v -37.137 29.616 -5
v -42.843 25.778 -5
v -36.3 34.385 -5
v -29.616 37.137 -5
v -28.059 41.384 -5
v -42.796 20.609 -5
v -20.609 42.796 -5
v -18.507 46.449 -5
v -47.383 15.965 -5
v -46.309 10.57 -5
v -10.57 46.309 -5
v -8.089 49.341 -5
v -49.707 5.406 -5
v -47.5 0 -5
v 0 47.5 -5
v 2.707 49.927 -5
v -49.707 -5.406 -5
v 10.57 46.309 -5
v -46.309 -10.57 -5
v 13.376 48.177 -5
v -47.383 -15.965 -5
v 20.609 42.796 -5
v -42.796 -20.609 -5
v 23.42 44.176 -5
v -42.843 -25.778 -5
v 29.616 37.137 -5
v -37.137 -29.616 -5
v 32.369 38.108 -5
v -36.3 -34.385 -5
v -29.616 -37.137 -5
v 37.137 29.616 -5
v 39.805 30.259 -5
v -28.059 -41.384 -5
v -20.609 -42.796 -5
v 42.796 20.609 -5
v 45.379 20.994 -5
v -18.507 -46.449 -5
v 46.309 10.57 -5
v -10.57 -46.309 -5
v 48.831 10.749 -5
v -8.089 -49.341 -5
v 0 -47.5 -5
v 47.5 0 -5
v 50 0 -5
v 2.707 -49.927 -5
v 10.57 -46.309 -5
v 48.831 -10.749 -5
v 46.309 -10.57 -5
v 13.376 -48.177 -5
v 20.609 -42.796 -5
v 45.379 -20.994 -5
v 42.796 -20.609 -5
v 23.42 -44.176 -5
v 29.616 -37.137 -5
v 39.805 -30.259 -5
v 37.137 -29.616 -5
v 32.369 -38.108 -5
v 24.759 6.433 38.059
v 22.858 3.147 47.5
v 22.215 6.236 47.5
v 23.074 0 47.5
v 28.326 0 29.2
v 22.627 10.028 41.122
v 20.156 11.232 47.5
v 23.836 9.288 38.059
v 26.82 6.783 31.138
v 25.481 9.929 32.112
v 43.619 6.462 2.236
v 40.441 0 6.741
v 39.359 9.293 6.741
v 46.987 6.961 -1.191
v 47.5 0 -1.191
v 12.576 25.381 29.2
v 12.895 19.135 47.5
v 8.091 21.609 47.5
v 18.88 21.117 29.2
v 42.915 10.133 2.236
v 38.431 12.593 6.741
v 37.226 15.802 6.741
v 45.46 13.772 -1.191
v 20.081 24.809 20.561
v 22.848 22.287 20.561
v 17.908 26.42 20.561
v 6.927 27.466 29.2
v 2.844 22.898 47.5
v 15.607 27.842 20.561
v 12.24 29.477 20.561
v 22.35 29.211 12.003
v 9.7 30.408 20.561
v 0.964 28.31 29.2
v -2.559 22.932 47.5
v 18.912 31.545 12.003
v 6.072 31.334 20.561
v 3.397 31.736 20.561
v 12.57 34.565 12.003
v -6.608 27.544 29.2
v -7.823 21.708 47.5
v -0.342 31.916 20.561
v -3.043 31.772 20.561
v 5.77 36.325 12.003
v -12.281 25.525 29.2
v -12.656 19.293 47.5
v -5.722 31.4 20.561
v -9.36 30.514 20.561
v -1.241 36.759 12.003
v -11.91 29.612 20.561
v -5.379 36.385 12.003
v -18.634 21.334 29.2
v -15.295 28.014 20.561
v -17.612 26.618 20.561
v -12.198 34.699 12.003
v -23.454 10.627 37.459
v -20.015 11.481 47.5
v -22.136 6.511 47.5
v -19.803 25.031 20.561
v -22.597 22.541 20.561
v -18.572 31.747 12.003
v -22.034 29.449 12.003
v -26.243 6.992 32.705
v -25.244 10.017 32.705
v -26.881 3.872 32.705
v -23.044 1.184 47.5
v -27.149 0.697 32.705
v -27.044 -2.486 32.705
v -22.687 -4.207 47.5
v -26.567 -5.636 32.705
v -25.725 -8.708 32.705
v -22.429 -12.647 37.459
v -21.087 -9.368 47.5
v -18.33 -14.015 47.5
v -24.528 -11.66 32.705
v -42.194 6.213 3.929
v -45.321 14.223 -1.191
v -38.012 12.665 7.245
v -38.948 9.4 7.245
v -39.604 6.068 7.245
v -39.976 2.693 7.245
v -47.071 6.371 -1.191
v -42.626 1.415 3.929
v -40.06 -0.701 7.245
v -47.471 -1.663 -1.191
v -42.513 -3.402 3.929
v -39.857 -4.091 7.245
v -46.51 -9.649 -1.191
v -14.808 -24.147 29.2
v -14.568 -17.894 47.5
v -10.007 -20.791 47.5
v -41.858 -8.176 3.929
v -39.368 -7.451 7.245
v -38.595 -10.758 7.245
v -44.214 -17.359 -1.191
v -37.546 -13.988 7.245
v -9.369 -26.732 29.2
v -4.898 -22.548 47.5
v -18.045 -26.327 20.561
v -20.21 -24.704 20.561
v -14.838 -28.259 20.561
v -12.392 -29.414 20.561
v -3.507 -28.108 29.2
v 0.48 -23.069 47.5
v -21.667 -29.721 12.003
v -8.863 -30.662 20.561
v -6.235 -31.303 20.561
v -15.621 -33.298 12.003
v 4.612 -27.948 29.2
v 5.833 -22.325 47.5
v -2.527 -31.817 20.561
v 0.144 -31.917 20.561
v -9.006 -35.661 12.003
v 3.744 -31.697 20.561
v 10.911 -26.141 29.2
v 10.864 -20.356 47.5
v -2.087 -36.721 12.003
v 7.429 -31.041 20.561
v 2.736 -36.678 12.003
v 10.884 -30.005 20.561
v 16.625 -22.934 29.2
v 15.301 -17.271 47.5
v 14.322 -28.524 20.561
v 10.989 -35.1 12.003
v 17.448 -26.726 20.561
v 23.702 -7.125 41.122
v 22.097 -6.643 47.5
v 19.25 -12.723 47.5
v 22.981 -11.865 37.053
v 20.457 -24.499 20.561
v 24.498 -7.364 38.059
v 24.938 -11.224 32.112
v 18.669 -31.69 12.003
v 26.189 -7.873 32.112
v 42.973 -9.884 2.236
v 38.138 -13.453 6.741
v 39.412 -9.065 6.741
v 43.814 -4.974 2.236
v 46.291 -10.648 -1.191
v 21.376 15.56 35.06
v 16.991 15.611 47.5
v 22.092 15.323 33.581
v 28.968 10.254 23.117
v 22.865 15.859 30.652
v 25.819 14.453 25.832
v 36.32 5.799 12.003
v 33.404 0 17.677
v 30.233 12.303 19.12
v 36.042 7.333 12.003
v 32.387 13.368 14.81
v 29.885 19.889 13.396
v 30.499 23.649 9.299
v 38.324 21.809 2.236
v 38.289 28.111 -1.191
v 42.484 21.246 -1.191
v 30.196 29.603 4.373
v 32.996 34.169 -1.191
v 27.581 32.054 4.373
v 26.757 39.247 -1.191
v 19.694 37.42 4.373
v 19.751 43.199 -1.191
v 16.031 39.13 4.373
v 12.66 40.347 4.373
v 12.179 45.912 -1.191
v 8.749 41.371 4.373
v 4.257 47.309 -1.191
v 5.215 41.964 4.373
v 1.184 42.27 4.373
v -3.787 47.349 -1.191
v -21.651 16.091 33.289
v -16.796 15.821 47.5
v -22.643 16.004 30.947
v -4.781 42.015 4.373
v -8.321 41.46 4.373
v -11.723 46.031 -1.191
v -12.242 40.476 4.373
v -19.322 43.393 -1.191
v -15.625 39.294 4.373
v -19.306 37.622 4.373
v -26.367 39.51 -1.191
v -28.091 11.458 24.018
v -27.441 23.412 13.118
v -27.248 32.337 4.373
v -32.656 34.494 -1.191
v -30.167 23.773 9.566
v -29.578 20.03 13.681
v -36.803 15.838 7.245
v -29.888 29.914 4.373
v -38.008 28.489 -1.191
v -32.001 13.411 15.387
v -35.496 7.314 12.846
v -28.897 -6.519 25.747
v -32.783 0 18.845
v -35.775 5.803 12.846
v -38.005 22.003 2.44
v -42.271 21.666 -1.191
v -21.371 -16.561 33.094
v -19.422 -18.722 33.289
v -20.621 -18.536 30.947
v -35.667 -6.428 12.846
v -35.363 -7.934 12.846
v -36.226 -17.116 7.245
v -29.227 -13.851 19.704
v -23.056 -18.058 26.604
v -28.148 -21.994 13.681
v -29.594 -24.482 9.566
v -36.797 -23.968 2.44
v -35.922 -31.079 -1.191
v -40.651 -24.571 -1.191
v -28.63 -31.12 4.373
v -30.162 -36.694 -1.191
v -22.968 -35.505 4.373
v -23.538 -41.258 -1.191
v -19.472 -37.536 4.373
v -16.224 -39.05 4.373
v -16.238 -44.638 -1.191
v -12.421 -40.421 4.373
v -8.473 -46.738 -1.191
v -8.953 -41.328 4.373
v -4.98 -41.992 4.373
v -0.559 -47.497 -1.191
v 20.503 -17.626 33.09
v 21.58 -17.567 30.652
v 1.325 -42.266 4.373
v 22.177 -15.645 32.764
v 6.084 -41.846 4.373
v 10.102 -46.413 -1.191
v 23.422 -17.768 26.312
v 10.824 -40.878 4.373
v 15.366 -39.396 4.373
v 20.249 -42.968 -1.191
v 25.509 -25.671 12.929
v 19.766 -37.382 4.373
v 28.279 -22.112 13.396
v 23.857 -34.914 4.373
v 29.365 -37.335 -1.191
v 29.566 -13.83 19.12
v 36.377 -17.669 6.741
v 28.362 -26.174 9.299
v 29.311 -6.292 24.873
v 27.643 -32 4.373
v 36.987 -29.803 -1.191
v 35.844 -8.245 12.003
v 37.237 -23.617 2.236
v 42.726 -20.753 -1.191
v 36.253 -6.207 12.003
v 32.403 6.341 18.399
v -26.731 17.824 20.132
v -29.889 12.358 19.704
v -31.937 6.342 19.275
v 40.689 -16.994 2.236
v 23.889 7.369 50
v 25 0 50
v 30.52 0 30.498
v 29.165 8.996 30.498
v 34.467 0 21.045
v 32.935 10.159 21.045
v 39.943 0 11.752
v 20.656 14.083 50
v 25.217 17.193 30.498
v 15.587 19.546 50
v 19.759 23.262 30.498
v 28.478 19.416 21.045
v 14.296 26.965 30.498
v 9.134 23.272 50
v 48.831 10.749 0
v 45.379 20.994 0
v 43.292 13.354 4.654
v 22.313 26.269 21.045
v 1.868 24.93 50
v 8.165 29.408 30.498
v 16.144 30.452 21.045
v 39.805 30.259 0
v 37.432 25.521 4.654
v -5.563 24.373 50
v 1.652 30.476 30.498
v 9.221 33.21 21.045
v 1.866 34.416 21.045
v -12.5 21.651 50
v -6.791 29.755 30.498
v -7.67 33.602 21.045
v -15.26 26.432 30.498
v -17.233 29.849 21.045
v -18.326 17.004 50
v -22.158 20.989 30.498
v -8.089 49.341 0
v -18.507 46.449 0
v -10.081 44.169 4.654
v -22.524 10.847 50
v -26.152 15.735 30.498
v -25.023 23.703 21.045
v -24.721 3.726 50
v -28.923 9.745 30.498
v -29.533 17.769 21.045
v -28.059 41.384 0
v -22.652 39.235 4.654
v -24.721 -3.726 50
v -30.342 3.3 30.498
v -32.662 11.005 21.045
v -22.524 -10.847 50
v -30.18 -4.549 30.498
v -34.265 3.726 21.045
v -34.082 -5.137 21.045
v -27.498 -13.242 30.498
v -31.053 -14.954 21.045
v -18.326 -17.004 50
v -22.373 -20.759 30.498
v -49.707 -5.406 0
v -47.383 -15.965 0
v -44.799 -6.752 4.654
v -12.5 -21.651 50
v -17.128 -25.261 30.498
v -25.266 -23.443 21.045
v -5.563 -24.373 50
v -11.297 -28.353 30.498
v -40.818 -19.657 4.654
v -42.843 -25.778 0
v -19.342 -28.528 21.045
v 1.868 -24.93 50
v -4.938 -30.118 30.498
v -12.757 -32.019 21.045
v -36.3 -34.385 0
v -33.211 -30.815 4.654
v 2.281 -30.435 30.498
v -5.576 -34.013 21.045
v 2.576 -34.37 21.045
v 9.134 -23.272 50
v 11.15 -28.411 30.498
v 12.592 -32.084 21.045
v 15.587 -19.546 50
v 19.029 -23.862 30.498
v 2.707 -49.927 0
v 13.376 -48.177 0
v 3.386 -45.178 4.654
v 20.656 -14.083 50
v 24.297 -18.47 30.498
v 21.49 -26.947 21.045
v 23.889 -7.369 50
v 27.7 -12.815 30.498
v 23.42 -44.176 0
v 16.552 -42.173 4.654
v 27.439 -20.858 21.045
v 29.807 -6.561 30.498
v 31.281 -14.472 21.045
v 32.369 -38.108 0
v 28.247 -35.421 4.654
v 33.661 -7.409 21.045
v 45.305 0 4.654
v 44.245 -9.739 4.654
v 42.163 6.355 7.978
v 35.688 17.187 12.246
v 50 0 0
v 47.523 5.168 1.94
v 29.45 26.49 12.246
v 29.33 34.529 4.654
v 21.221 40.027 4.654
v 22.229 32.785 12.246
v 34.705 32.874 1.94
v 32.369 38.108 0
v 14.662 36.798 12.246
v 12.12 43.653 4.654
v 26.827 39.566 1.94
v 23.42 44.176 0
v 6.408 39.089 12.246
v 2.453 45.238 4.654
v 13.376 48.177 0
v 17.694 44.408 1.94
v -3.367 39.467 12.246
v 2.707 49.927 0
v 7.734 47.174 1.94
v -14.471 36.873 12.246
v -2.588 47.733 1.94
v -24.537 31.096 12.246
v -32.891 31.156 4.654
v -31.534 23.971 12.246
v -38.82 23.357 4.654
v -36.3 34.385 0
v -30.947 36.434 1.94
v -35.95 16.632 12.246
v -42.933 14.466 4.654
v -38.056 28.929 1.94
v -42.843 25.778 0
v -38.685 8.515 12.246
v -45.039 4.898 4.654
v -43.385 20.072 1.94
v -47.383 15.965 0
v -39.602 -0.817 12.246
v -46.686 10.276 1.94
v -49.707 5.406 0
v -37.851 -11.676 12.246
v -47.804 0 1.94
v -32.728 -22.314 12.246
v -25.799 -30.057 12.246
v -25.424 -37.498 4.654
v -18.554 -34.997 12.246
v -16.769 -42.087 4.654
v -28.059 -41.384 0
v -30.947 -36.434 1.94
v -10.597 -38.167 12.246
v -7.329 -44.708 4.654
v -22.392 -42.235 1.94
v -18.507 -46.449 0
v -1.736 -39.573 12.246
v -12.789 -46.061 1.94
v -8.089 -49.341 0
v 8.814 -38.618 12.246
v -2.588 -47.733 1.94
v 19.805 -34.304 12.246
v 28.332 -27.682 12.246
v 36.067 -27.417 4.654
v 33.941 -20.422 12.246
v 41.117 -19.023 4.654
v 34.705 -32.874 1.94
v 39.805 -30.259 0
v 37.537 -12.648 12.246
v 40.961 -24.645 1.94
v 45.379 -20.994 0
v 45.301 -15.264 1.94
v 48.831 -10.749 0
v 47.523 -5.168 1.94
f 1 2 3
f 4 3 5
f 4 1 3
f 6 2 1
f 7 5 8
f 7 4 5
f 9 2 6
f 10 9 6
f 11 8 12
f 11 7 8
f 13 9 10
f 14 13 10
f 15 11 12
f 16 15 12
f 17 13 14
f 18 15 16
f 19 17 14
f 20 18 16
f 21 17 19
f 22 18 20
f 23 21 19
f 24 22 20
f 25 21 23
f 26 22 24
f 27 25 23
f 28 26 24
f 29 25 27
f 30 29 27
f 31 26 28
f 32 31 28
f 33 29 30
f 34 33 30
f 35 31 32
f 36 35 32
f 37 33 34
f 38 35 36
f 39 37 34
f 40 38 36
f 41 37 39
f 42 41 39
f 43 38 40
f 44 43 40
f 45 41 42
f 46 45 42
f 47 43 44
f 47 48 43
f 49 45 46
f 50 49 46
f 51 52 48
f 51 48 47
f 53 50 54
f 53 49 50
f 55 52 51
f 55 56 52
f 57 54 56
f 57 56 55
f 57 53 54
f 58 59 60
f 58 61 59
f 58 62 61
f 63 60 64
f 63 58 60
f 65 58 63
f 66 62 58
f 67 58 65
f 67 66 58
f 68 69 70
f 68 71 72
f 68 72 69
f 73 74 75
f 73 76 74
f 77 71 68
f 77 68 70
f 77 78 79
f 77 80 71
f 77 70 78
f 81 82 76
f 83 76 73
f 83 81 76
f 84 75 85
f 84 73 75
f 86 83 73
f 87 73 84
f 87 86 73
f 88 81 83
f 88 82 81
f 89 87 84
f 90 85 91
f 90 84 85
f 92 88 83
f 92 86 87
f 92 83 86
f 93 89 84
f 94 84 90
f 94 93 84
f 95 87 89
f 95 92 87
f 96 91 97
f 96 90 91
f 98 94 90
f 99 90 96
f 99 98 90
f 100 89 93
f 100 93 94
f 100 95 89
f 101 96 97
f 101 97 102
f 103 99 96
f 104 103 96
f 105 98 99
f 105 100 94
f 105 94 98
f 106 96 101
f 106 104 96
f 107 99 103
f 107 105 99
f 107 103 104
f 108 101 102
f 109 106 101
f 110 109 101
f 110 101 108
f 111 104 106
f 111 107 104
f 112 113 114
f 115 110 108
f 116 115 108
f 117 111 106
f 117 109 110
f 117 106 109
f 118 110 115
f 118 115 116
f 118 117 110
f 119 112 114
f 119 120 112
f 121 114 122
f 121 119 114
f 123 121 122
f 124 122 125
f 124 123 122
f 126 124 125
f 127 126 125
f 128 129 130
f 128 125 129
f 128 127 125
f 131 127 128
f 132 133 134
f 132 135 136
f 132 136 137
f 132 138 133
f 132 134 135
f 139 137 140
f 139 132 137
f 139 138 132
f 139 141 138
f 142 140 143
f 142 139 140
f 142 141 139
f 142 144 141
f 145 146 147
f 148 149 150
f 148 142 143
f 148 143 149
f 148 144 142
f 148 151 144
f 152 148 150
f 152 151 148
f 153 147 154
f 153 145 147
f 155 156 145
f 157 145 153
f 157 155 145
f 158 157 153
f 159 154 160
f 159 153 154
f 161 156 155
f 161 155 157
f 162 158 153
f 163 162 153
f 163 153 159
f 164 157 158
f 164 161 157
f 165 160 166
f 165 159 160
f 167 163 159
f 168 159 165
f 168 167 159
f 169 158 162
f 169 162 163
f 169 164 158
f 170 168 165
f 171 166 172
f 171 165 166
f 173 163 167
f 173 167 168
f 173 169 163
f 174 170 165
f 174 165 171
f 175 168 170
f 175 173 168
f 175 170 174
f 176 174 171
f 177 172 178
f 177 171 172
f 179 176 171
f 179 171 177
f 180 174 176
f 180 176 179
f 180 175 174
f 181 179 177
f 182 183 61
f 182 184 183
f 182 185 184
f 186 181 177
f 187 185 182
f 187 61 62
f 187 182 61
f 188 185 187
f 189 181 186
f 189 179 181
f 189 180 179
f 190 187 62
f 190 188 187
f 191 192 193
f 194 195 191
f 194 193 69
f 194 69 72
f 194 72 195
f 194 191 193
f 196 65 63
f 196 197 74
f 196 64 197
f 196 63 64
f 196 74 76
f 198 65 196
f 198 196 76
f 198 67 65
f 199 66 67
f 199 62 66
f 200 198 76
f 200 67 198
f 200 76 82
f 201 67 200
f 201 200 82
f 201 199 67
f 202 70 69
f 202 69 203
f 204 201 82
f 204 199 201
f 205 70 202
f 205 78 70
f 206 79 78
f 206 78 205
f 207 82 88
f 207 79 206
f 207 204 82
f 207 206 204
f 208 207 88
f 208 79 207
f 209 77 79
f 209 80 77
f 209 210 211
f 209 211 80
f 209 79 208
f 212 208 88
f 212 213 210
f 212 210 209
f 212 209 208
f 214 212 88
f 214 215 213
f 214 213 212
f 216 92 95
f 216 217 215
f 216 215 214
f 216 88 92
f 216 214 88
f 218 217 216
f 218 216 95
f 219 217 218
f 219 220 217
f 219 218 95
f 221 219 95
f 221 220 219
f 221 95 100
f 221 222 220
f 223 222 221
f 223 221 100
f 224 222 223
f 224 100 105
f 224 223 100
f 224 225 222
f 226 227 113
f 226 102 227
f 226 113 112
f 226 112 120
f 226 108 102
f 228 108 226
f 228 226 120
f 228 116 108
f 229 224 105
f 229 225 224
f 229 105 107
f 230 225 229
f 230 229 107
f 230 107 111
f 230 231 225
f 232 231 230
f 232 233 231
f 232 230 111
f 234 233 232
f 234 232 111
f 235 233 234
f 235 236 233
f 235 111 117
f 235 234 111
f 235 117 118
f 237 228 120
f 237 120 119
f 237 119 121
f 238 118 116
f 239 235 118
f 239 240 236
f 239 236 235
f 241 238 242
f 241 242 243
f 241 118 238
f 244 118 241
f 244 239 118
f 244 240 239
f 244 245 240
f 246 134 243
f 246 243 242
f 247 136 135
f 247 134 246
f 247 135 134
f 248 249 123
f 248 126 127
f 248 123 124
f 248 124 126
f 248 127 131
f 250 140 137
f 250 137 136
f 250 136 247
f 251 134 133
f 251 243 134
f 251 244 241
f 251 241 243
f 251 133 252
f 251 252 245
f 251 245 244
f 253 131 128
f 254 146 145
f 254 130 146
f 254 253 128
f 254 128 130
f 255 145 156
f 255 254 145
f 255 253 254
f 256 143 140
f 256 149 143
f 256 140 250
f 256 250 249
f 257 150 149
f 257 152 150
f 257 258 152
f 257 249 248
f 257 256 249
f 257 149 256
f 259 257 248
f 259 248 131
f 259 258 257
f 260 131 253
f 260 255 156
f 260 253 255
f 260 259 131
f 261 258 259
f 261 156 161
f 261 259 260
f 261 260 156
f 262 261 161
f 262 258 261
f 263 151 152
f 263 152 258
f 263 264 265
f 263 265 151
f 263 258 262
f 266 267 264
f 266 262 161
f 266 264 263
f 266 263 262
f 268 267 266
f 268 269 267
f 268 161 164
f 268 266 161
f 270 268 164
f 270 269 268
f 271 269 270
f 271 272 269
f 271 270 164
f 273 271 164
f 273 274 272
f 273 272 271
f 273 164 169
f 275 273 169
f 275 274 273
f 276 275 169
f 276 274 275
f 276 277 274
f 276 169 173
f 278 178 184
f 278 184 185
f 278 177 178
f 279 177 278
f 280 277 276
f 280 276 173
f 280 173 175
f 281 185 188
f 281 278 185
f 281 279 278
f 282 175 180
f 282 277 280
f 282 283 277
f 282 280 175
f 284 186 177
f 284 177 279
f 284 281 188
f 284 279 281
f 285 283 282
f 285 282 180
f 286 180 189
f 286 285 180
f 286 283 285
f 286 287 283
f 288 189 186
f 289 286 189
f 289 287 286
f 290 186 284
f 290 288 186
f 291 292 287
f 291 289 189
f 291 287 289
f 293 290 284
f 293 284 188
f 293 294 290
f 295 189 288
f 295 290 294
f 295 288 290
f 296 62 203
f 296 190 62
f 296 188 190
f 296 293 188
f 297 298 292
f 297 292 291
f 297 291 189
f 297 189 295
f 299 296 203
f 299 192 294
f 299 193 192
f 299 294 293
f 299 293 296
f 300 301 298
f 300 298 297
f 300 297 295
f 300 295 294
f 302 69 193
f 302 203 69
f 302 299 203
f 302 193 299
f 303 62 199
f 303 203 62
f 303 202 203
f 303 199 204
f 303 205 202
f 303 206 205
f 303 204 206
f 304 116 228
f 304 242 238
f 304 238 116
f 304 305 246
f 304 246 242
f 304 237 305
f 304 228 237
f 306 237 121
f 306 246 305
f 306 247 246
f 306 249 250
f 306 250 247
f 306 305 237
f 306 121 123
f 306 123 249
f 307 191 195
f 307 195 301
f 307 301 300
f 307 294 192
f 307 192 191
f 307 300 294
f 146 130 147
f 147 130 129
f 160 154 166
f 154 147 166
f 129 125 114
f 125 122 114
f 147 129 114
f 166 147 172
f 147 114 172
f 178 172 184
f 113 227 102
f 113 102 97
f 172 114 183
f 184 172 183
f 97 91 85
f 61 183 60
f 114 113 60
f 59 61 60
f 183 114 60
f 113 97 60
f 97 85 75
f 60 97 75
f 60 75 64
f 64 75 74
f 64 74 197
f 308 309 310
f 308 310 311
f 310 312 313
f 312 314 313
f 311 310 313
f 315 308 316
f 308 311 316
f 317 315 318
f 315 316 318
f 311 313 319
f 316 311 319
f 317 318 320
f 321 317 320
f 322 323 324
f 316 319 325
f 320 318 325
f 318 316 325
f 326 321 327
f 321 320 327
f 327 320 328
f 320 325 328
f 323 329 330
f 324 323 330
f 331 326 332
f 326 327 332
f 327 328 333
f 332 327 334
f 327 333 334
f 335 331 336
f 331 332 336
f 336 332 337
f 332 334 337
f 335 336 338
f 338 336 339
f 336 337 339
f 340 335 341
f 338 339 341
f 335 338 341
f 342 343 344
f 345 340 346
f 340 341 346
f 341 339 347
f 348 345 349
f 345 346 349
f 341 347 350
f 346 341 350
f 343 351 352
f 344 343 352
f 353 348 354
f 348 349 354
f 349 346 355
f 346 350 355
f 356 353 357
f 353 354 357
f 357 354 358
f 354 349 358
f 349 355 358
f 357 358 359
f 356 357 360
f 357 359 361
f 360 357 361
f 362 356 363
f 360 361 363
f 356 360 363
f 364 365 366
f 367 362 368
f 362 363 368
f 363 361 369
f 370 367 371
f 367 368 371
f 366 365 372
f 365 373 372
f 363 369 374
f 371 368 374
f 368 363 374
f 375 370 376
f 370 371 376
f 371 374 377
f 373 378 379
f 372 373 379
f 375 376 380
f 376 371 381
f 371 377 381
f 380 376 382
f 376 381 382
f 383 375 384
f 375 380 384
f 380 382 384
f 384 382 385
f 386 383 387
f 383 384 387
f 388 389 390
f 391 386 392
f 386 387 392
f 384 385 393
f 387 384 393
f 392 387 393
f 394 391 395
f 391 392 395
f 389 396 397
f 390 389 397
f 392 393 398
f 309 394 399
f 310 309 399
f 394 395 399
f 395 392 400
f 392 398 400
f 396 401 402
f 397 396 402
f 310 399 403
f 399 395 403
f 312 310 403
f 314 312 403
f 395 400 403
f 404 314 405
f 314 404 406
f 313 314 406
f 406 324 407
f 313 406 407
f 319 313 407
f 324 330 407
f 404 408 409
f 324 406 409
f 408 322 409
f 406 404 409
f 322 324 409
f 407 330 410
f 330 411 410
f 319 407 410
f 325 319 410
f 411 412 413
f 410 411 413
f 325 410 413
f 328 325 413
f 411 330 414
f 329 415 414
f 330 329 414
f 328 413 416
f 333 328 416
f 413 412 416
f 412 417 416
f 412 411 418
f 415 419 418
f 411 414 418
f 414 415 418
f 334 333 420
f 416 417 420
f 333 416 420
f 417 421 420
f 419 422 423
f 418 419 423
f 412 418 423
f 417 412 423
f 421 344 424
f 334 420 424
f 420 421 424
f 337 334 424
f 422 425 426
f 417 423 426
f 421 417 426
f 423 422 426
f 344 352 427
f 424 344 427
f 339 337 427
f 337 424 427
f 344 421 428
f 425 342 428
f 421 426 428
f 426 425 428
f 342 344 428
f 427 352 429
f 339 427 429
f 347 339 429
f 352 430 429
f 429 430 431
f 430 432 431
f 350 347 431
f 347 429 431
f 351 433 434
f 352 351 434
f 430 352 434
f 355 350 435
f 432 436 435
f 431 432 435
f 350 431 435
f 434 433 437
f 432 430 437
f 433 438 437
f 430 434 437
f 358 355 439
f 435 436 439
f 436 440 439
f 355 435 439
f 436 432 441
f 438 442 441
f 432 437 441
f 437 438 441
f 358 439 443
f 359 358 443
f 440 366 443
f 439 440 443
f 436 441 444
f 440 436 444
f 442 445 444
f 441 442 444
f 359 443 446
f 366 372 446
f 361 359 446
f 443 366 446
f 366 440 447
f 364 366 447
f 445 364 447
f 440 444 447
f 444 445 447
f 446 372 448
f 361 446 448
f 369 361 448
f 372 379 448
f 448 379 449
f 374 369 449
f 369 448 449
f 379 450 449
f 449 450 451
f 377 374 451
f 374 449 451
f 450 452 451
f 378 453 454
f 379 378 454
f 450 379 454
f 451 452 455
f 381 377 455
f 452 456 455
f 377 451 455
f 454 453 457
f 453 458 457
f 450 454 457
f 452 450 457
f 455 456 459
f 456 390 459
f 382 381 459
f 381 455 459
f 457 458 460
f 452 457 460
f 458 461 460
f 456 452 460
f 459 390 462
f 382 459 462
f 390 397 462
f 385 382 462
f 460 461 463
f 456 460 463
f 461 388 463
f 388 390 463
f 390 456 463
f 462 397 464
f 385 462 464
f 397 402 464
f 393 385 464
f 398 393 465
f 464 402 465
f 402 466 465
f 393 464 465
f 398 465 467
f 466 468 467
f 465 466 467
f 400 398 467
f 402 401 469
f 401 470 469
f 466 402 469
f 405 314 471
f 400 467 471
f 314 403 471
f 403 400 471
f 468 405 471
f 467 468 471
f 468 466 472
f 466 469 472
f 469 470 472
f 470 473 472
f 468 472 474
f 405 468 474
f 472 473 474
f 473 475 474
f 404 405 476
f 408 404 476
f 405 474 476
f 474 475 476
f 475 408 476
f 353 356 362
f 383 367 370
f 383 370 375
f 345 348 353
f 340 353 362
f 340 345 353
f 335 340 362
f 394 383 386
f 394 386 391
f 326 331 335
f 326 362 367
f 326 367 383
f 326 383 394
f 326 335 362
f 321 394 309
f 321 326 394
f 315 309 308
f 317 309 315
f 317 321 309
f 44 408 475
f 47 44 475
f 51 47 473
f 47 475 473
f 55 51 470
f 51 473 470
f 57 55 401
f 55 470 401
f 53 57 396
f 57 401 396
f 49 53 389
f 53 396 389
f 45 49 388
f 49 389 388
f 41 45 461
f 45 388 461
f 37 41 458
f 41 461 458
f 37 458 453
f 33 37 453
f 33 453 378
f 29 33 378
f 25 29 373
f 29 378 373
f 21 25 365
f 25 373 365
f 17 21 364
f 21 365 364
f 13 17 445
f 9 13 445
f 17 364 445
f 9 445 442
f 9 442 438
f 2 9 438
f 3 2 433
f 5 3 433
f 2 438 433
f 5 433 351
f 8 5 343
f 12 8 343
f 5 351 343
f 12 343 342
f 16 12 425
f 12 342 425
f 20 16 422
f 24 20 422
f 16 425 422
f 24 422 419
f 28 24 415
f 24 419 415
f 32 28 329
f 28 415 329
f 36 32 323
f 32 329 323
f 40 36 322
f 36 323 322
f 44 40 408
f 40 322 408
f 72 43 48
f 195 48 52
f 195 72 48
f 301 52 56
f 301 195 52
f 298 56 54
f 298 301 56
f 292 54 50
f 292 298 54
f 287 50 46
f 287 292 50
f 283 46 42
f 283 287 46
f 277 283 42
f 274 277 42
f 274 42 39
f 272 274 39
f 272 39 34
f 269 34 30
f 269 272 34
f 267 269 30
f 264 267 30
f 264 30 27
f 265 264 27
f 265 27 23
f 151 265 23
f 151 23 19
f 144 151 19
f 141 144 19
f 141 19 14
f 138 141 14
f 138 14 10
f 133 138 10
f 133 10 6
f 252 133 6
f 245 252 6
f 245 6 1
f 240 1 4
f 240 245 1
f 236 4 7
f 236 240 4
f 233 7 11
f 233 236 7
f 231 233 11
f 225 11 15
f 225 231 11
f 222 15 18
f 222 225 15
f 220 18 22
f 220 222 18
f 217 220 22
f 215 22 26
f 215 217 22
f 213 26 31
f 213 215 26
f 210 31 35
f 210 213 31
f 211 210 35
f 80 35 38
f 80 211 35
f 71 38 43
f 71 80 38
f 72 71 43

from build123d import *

# Parameters (mm, degrees)
F2_R     = 50
F3_DEPTH = 5
F4_T     = -2.5


with BuildPart() as f1:
    # F0 (on Front) → F1 (revolve)
    with BuildSketch(Plane.XZ):
        with BuildLine():
            Line((25, 50), (0, 50))
            Line((0, 50), (0, 0))
            Line((0, 0), (50, 0))
            add(Edge.make_bspline(
                [(25, 50), (28.0258275564, 38.6), (31.9147522376, 21.2908032716), (46, 3), (50, 0)],
                knots=[0, 0, 0, 0, 0.5293414761, 1, 1, 1, 1], degree=3))
        make_face()
    revolve(axis=Axis((0, 0, 25), (0, 0, 1)))

    # F2 (on face) → F3 (join)
    with BuildSketch(Plane(origin=(0, 0, 0), x_dir=(1, 0, 0), z_dir=(0, 0, -1))):
        Circle(F2_R)
    extrude(amount=F3_DEPTH)

    # F4
    f4_openings = [f1.faces().sort_by_distance(p)[0] for p in [
        (0, 0, -5),
    ]]
    offset(amount=F4_T, openings=f4_openings, kind=Kind.INTERSECTION)


solid = f1.part
